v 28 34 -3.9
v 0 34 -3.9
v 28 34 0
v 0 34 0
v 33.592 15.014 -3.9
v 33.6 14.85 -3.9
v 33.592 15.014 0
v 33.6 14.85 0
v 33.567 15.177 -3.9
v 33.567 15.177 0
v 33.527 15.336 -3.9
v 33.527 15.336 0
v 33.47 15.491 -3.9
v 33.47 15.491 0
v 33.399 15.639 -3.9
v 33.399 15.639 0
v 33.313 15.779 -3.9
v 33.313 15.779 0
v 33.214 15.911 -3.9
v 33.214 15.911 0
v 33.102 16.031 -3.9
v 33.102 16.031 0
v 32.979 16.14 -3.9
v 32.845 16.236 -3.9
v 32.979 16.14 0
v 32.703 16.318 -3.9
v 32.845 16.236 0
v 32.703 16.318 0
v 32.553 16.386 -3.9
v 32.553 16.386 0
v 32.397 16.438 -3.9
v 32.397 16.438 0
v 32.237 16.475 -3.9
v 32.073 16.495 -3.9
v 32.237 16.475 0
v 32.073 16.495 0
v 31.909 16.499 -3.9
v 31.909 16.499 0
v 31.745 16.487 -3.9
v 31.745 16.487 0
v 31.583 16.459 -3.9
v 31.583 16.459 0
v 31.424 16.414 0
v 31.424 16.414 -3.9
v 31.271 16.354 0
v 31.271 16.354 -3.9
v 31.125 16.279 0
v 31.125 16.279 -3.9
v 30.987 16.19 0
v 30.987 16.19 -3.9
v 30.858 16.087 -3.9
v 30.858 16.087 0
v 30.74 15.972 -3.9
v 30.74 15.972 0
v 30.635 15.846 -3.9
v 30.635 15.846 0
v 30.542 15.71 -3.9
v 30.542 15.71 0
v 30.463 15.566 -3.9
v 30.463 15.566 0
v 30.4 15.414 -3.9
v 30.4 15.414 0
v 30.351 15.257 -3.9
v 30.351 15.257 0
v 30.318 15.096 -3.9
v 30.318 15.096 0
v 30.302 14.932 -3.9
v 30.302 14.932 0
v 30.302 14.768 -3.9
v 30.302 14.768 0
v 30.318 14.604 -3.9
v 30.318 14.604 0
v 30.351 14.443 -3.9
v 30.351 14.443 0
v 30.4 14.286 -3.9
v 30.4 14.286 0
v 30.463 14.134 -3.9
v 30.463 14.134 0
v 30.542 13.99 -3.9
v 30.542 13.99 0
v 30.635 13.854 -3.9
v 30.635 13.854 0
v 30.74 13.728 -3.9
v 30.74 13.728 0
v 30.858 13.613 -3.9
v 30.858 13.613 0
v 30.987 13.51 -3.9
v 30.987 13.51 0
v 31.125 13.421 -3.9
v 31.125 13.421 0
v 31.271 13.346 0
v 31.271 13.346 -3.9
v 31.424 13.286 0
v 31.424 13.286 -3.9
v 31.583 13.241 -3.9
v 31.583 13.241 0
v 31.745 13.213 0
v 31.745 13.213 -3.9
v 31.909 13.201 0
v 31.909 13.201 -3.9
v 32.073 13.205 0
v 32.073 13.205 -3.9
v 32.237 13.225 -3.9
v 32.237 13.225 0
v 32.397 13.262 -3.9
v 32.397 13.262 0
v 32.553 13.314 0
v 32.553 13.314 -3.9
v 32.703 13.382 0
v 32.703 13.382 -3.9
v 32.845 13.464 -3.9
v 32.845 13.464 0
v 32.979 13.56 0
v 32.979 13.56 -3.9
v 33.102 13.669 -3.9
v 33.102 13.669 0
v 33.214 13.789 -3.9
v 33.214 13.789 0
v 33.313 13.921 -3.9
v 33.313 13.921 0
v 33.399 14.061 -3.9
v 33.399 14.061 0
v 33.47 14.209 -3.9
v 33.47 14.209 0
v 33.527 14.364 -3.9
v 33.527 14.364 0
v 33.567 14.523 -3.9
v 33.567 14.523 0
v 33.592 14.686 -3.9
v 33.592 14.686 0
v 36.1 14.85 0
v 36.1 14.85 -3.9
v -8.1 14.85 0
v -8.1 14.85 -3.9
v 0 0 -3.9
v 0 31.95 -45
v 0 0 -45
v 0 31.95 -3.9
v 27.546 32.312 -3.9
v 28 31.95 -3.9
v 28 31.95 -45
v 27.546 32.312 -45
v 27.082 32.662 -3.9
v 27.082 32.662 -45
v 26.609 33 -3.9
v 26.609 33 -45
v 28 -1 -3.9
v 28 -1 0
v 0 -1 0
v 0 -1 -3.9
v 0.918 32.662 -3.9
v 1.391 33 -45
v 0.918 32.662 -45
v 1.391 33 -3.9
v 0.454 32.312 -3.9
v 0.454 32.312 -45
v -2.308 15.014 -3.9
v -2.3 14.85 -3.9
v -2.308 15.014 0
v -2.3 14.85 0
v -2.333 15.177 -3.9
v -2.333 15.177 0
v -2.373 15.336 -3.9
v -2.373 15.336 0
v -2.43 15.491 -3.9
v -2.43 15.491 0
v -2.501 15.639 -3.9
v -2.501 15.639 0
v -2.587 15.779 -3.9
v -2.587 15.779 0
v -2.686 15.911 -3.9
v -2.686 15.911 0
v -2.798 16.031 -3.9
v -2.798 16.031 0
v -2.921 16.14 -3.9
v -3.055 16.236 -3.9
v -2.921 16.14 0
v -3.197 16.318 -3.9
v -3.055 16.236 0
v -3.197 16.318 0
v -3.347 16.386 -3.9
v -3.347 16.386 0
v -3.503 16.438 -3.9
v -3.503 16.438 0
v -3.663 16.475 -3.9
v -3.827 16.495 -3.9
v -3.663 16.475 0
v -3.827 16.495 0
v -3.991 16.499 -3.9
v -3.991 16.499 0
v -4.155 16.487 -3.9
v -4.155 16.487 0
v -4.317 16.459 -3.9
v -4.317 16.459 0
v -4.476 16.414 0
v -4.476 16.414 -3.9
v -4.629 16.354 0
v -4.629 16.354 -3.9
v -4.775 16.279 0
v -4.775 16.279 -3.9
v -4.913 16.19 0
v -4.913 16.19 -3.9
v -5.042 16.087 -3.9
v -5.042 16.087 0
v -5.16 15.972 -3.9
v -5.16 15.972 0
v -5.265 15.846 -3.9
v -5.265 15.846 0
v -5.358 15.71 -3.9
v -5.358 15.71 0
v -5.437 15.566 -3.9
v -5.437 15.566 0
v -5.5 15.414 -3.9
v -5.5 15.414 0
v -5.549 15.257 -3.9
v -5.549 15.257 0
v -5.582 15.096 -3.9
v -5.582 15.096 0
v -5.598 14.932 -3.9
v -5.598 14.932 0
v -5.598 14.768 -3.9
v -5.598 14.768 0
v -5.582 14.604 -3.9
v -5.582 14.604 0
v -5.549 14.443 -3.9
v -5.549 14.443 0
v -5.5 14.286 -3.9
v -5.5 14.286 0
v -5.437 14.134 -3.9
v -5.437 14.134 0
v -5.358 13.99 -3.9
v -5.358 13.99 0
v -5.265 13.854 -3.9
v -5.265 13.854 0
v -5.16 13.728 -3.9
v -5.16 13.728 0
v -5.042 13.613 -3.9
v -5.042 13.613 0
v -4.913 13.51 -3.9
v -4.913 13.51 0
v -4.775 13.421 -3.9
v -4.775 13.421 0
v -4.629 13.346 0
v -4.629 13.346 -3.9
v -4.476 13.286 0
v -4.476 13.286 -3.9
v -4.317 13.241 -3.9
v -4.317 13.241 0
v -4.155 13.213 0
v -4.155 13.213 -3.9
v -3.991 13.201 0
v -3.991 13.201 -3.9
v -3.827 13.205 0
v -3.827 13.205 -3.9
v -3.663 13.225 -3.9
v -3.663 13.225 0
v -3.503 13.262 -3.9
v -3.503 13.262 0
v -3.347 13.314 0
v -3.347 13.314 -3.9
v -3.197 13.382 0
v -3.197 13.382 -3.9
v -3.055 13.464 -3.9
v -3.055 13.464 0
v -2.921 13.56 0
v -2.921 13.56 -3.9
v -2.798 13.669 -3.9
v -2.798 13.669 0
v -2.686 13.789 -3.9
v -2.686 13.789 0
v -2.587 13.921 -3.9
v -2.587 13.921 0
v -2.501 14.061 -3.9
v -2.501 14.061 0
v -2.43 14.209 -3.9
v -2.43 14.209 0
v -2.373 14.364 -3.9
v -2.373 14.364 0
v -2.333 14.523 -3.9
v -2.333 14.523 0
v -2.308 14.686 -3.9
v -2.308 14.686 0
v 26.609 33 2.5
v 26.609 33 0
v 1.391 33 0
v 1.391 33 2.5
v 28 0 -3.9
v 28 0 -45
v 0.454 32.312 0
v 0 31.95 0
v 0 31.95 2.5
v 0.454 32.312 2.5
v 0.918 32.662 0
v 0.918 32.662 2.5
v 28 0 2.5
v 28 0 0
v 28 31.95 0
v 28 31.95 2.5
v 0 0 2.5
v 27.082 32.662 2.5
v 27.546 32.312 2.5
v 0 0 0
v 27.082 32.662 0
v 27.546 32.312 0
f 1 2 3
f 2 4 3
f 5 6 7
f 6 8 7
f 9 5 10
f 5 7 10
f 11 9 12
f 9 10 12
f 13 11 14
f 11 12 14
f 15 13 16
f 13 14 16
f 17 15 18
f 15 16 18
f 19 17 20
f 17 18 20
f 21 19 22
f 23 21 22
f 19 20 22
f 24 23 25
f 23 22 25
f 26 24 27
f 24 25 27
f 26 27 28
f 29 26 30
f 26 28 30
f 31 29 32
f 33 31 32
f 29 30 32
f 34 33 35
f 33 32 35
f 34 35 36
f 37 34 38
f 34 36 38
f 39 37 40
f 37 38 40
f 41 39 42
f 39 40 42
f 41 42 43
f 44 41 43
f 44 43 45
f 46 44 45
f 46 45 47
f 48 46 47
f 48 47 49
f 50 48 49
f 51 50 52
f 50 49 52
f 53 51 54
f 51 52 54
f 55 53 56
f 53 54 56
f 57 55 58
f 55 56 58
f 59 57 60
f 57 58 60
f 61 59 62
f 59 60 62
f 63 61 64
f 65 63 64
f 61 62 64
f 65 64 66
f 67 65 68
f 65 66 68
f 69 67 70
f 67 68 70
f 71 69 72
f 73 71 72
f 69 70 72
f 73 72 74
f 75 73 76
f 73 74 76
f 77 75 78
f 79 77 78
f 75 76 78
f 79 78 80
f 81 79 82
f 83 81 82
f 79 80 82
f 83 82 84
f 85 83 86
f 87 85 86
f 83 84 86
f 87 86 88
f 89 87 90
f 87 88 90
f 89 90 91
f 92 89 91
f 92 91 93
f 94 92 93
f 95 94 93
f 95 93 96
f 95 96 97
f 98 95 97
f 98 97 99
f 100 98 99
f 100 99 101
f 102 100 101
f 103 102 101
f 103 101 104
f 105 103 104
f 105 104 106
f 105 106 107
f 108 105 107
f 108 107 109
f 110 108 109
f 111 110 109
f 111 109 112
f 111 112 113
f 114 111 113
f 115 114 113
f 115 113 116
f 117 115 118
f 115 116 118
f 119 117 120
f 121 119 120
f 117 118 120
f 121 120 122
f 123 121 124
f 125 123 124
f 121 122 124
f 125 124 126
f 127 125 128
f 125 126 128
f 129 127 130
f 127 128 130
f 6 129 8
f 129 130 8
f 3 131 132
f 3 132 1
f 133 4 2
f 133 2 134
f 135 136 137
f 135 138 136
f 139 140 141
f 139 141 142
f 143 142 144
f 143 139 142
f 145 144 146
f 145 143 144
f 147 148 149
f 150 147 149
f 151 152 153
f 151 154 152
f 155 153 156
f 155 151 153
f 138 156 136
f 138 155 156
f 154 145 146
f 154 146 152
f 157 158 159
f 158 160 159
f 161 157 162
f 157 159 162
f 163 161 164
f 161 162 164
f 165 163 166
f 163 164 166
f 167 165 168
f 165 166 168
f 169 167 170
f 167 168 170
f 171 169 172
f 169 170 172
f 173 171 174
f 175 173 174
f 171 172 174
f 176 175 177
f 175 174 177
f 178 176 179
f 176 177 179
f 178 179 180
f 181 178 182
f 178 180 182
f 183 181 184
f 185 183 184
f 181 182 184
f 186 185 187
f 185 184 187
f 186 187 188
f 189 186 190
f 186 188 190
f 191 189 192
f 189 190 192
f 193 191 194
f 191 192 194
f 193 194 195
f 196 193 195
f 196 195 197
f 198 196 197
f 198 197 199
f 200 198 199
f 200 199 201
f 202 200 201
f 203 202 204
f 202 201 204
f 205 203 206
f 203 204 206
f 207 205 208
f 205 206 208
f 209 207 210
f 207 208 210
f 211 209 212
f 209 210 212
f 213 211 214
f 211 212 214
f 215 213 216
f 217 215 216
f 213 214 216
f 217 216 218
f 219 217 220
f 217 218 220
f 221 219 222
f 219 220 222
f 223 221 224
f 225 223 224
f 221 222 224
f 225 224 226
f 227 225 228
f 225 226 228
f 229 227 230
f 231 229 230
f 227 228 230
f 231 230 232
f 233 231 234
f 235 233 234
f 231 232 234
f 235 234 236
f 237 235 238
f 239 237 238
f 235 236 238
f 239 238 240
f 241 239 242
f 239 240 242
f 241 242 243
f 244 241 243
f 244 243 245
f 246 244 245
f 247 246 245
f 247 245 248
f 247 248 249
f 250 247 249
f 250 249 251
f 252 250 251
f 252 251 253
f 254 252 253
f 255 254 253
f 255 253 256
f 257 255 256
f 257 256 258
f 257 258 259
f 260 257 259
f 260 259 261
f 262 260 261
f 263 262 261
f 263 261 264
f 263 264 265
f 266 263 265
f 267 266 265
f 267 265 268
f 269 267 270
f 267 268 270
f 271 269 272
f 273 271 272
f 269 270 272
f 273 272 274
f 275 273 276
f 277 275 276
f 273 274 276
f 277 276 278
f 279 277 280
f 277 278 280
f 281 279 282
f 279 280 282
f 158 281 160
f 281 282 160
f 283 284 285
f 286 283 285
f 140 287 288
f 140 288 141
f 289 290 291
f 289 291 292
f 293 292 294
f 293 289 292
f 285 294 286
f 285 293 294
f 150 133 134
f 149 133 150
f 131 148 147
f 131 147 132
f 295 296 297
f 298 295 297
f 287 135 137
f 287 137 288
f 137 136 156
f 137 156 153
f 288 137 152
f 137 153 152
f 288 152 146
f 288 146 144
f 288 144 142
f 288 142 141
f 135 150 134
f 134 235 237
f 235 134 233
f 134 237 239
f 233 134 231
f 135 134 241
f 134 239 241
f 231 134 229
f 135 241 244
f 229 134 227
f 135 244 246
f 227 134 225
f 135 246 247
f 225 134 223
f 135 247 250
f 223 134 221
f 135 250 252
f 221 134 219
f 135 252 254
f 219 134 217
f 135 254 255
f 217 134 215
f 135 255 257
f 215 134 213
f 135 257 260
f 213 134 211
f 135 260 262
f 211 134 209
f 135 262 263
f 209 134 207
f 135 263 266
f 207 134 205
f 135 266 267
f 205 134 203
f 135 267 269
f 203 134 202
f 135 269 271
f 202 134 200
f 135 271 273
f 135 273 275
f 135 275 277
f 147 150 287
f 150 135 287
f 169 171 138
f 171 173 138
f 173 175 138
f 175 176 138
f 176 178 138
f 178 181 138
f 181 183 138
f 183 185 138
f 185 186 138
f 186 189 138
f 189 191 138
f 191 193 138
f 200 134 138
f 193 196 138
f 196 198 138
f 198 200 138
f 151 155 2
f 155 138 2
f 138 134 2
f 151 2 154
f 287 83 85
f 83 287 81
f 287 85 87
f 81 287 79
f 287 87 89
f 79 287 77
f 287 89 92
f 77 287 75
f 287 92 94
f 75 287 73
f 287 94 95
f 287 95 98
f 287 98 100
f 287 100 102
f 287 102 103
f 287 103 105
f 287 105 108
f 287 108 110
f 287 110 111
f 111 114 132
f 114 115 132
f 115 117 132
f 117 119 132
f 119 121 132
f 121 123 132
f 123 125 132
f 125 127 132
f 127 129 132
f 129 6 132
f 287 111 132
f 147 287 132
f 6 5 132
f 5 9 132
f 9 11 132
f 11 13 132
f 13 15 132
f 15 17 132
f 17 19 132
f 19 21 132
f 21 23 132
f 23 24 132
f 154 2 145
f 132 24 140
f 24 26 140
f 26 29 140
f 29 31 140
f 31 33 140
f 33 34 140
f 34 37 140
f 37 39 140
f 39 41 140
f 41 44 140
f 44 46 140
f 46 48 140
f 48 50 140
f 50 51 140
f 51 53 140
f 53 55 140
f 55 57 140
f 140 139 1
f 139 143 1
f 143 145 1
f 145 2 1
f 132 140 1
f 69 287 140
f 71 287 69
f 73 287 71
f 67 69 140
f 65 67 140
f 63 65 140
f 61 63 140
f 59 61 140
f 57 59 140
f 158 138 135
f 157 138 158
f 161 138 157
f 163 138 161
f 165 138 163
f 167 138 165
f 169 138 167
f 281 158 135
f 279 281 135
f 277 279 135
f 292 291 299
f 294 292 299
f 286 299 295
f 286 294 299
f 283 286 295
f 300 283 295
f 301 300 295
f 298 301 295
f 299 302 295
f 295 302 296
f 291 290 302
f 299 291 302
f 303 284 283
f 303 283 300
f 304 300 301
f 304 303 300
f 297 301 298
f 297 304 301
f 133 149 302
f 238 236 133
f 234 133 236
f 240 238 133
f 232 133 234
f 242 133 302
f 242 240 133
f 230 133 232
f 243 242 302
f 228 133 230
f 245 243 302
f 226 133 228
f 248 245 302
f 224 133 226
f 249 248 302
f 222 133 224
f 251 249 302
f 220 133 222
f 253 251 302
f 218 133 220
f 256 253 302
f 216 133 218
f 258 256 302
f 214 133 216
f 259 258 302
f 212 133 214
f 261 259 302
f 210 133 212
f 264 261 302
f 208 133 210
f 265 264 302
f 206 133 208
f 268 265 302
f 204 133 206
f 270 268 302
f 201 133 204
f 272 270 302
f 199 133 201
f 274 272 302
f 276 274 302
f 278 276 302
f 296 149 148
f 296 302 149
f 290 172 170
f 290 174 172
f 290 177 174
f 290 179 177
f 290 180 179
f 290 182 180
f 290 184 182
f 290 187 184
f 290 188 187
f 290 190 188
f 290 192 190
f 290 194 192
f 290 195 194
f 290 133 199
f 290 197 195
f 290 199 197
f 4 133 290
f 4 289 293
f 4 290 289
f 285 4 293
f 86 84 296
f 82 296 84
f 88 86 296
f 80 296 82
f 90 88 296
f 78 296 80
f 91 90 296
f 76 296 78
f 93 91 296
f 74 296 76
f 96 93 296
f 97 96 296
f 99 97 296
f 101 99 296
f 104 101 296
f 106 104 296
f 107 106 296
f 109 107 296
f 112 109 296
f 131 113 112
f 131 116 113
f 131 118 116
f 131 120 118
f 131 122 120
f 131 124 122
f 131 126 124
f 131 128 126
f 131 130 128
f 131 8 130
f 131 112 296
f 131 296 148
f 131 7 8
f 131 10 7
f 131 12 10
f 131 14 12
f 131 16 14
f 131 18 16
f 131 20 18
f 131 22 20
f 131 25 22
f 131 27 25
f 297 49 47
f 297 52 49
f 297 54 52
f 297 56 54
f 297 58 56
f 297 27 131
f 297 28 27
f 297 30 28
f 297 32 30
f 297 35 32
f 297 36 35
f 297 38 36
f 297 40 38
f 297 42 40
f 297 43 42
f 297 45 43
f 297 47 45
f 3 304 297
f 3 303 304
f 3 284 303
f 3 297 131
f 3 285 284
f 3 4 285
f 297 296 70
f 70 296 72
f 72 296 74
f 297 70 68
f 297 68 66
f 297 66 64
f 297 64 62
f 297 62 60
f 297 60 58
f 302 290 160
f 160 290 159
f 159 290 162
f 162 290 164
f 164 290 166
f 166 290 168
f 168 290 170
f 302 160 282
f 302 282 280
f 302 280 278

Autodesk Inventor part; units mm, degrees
ref_plane "YZ Plane" through (0, 0, 0) normal (1, 0, 0) x (0, 1, 0)
ref_plane "XZ Plane" through (0, 0, 0) normal (0, 1, 0) x (-1, 0, 0)
ref_plane "XY Plane" through (0, 0, 0) normal (0, 0, 1) x (1, 0, 0)
sketch "스케치1" plane through (0, 0, 0) normal (0, 0, 1) x (1, 0, 0)
  line L0 (0, 0) -> (28, 0)
  line L1 (28, 0) -> (28, 33)
  line L2 (28, 33) -> (0, 33)
  line L3 (0, 33) -> (0, 0)
  line L4 (0, 34) -> (28, 34)
  line L5 (28, 34) -> (28, -1)
  line L6 (28, -1) -> (0, -1)
  line L7 (0, -1) -> (0, 34)
  circle A0 centre (-3.95, 14.85) radius 1.65
  circle A1 centre (31.95, 14.85) radius 1.65
  circle A2 centre (14, 14.85) radius 22.1
  line L8 (0, 34) -> (-8.1, 14.85)
  line L9 (-8.1, 14.85) -> (0, -1)
  line L10 (28, -1) -> (36.1, 14.85)
  line L11 (36.1, 14.85) -> (28, 34)
  point P0 (29.3923, 30.7084)
  point P1 (26.609, 33)
  point P2 (1.391, 33)
  point P3 (-1.3923, 30.7084)
  point P4 (0, 31.95)
  point P5 (28, 31.95)
  dimension "d0" = 28
  dimension "d1" = 33
  dimension "d2" = 28
  dimension "d3" = 35
  dimension "d4" = 1
  dimension "d5" = 3.3
  dimension "d6" = 3.3
  dimension "d7" = 35.9
  dimension "d8" = 3.95
  dimension "d9" = 15.85
  dimension "d10" = 44.2
extrude "돌출1" add sketch "스케치1" against normal blind 3.9 contours L3 A2 L2 L1 L0 | L7 L9 L8 A2 L3 | L0 L5 L6 L7 | L1 A2 L11 L10 L5 | A2 L8 L7 L3 | L3 L2 A2 | A2 L2 L1 | L1 L5 L11 A2 | L7 L4 A2 L2 | A2 L4 L2 | L2 A2 L4 L5
extrude "돌출2" add sketch "스케치1" against normal blind 45 contours L3 A2 L2 L1 L0
extrude "돌출3" add sketch "스케치1" along normal blind 2.5 contours L3 A2 L2 L1 L0
properties part number "outlet"
